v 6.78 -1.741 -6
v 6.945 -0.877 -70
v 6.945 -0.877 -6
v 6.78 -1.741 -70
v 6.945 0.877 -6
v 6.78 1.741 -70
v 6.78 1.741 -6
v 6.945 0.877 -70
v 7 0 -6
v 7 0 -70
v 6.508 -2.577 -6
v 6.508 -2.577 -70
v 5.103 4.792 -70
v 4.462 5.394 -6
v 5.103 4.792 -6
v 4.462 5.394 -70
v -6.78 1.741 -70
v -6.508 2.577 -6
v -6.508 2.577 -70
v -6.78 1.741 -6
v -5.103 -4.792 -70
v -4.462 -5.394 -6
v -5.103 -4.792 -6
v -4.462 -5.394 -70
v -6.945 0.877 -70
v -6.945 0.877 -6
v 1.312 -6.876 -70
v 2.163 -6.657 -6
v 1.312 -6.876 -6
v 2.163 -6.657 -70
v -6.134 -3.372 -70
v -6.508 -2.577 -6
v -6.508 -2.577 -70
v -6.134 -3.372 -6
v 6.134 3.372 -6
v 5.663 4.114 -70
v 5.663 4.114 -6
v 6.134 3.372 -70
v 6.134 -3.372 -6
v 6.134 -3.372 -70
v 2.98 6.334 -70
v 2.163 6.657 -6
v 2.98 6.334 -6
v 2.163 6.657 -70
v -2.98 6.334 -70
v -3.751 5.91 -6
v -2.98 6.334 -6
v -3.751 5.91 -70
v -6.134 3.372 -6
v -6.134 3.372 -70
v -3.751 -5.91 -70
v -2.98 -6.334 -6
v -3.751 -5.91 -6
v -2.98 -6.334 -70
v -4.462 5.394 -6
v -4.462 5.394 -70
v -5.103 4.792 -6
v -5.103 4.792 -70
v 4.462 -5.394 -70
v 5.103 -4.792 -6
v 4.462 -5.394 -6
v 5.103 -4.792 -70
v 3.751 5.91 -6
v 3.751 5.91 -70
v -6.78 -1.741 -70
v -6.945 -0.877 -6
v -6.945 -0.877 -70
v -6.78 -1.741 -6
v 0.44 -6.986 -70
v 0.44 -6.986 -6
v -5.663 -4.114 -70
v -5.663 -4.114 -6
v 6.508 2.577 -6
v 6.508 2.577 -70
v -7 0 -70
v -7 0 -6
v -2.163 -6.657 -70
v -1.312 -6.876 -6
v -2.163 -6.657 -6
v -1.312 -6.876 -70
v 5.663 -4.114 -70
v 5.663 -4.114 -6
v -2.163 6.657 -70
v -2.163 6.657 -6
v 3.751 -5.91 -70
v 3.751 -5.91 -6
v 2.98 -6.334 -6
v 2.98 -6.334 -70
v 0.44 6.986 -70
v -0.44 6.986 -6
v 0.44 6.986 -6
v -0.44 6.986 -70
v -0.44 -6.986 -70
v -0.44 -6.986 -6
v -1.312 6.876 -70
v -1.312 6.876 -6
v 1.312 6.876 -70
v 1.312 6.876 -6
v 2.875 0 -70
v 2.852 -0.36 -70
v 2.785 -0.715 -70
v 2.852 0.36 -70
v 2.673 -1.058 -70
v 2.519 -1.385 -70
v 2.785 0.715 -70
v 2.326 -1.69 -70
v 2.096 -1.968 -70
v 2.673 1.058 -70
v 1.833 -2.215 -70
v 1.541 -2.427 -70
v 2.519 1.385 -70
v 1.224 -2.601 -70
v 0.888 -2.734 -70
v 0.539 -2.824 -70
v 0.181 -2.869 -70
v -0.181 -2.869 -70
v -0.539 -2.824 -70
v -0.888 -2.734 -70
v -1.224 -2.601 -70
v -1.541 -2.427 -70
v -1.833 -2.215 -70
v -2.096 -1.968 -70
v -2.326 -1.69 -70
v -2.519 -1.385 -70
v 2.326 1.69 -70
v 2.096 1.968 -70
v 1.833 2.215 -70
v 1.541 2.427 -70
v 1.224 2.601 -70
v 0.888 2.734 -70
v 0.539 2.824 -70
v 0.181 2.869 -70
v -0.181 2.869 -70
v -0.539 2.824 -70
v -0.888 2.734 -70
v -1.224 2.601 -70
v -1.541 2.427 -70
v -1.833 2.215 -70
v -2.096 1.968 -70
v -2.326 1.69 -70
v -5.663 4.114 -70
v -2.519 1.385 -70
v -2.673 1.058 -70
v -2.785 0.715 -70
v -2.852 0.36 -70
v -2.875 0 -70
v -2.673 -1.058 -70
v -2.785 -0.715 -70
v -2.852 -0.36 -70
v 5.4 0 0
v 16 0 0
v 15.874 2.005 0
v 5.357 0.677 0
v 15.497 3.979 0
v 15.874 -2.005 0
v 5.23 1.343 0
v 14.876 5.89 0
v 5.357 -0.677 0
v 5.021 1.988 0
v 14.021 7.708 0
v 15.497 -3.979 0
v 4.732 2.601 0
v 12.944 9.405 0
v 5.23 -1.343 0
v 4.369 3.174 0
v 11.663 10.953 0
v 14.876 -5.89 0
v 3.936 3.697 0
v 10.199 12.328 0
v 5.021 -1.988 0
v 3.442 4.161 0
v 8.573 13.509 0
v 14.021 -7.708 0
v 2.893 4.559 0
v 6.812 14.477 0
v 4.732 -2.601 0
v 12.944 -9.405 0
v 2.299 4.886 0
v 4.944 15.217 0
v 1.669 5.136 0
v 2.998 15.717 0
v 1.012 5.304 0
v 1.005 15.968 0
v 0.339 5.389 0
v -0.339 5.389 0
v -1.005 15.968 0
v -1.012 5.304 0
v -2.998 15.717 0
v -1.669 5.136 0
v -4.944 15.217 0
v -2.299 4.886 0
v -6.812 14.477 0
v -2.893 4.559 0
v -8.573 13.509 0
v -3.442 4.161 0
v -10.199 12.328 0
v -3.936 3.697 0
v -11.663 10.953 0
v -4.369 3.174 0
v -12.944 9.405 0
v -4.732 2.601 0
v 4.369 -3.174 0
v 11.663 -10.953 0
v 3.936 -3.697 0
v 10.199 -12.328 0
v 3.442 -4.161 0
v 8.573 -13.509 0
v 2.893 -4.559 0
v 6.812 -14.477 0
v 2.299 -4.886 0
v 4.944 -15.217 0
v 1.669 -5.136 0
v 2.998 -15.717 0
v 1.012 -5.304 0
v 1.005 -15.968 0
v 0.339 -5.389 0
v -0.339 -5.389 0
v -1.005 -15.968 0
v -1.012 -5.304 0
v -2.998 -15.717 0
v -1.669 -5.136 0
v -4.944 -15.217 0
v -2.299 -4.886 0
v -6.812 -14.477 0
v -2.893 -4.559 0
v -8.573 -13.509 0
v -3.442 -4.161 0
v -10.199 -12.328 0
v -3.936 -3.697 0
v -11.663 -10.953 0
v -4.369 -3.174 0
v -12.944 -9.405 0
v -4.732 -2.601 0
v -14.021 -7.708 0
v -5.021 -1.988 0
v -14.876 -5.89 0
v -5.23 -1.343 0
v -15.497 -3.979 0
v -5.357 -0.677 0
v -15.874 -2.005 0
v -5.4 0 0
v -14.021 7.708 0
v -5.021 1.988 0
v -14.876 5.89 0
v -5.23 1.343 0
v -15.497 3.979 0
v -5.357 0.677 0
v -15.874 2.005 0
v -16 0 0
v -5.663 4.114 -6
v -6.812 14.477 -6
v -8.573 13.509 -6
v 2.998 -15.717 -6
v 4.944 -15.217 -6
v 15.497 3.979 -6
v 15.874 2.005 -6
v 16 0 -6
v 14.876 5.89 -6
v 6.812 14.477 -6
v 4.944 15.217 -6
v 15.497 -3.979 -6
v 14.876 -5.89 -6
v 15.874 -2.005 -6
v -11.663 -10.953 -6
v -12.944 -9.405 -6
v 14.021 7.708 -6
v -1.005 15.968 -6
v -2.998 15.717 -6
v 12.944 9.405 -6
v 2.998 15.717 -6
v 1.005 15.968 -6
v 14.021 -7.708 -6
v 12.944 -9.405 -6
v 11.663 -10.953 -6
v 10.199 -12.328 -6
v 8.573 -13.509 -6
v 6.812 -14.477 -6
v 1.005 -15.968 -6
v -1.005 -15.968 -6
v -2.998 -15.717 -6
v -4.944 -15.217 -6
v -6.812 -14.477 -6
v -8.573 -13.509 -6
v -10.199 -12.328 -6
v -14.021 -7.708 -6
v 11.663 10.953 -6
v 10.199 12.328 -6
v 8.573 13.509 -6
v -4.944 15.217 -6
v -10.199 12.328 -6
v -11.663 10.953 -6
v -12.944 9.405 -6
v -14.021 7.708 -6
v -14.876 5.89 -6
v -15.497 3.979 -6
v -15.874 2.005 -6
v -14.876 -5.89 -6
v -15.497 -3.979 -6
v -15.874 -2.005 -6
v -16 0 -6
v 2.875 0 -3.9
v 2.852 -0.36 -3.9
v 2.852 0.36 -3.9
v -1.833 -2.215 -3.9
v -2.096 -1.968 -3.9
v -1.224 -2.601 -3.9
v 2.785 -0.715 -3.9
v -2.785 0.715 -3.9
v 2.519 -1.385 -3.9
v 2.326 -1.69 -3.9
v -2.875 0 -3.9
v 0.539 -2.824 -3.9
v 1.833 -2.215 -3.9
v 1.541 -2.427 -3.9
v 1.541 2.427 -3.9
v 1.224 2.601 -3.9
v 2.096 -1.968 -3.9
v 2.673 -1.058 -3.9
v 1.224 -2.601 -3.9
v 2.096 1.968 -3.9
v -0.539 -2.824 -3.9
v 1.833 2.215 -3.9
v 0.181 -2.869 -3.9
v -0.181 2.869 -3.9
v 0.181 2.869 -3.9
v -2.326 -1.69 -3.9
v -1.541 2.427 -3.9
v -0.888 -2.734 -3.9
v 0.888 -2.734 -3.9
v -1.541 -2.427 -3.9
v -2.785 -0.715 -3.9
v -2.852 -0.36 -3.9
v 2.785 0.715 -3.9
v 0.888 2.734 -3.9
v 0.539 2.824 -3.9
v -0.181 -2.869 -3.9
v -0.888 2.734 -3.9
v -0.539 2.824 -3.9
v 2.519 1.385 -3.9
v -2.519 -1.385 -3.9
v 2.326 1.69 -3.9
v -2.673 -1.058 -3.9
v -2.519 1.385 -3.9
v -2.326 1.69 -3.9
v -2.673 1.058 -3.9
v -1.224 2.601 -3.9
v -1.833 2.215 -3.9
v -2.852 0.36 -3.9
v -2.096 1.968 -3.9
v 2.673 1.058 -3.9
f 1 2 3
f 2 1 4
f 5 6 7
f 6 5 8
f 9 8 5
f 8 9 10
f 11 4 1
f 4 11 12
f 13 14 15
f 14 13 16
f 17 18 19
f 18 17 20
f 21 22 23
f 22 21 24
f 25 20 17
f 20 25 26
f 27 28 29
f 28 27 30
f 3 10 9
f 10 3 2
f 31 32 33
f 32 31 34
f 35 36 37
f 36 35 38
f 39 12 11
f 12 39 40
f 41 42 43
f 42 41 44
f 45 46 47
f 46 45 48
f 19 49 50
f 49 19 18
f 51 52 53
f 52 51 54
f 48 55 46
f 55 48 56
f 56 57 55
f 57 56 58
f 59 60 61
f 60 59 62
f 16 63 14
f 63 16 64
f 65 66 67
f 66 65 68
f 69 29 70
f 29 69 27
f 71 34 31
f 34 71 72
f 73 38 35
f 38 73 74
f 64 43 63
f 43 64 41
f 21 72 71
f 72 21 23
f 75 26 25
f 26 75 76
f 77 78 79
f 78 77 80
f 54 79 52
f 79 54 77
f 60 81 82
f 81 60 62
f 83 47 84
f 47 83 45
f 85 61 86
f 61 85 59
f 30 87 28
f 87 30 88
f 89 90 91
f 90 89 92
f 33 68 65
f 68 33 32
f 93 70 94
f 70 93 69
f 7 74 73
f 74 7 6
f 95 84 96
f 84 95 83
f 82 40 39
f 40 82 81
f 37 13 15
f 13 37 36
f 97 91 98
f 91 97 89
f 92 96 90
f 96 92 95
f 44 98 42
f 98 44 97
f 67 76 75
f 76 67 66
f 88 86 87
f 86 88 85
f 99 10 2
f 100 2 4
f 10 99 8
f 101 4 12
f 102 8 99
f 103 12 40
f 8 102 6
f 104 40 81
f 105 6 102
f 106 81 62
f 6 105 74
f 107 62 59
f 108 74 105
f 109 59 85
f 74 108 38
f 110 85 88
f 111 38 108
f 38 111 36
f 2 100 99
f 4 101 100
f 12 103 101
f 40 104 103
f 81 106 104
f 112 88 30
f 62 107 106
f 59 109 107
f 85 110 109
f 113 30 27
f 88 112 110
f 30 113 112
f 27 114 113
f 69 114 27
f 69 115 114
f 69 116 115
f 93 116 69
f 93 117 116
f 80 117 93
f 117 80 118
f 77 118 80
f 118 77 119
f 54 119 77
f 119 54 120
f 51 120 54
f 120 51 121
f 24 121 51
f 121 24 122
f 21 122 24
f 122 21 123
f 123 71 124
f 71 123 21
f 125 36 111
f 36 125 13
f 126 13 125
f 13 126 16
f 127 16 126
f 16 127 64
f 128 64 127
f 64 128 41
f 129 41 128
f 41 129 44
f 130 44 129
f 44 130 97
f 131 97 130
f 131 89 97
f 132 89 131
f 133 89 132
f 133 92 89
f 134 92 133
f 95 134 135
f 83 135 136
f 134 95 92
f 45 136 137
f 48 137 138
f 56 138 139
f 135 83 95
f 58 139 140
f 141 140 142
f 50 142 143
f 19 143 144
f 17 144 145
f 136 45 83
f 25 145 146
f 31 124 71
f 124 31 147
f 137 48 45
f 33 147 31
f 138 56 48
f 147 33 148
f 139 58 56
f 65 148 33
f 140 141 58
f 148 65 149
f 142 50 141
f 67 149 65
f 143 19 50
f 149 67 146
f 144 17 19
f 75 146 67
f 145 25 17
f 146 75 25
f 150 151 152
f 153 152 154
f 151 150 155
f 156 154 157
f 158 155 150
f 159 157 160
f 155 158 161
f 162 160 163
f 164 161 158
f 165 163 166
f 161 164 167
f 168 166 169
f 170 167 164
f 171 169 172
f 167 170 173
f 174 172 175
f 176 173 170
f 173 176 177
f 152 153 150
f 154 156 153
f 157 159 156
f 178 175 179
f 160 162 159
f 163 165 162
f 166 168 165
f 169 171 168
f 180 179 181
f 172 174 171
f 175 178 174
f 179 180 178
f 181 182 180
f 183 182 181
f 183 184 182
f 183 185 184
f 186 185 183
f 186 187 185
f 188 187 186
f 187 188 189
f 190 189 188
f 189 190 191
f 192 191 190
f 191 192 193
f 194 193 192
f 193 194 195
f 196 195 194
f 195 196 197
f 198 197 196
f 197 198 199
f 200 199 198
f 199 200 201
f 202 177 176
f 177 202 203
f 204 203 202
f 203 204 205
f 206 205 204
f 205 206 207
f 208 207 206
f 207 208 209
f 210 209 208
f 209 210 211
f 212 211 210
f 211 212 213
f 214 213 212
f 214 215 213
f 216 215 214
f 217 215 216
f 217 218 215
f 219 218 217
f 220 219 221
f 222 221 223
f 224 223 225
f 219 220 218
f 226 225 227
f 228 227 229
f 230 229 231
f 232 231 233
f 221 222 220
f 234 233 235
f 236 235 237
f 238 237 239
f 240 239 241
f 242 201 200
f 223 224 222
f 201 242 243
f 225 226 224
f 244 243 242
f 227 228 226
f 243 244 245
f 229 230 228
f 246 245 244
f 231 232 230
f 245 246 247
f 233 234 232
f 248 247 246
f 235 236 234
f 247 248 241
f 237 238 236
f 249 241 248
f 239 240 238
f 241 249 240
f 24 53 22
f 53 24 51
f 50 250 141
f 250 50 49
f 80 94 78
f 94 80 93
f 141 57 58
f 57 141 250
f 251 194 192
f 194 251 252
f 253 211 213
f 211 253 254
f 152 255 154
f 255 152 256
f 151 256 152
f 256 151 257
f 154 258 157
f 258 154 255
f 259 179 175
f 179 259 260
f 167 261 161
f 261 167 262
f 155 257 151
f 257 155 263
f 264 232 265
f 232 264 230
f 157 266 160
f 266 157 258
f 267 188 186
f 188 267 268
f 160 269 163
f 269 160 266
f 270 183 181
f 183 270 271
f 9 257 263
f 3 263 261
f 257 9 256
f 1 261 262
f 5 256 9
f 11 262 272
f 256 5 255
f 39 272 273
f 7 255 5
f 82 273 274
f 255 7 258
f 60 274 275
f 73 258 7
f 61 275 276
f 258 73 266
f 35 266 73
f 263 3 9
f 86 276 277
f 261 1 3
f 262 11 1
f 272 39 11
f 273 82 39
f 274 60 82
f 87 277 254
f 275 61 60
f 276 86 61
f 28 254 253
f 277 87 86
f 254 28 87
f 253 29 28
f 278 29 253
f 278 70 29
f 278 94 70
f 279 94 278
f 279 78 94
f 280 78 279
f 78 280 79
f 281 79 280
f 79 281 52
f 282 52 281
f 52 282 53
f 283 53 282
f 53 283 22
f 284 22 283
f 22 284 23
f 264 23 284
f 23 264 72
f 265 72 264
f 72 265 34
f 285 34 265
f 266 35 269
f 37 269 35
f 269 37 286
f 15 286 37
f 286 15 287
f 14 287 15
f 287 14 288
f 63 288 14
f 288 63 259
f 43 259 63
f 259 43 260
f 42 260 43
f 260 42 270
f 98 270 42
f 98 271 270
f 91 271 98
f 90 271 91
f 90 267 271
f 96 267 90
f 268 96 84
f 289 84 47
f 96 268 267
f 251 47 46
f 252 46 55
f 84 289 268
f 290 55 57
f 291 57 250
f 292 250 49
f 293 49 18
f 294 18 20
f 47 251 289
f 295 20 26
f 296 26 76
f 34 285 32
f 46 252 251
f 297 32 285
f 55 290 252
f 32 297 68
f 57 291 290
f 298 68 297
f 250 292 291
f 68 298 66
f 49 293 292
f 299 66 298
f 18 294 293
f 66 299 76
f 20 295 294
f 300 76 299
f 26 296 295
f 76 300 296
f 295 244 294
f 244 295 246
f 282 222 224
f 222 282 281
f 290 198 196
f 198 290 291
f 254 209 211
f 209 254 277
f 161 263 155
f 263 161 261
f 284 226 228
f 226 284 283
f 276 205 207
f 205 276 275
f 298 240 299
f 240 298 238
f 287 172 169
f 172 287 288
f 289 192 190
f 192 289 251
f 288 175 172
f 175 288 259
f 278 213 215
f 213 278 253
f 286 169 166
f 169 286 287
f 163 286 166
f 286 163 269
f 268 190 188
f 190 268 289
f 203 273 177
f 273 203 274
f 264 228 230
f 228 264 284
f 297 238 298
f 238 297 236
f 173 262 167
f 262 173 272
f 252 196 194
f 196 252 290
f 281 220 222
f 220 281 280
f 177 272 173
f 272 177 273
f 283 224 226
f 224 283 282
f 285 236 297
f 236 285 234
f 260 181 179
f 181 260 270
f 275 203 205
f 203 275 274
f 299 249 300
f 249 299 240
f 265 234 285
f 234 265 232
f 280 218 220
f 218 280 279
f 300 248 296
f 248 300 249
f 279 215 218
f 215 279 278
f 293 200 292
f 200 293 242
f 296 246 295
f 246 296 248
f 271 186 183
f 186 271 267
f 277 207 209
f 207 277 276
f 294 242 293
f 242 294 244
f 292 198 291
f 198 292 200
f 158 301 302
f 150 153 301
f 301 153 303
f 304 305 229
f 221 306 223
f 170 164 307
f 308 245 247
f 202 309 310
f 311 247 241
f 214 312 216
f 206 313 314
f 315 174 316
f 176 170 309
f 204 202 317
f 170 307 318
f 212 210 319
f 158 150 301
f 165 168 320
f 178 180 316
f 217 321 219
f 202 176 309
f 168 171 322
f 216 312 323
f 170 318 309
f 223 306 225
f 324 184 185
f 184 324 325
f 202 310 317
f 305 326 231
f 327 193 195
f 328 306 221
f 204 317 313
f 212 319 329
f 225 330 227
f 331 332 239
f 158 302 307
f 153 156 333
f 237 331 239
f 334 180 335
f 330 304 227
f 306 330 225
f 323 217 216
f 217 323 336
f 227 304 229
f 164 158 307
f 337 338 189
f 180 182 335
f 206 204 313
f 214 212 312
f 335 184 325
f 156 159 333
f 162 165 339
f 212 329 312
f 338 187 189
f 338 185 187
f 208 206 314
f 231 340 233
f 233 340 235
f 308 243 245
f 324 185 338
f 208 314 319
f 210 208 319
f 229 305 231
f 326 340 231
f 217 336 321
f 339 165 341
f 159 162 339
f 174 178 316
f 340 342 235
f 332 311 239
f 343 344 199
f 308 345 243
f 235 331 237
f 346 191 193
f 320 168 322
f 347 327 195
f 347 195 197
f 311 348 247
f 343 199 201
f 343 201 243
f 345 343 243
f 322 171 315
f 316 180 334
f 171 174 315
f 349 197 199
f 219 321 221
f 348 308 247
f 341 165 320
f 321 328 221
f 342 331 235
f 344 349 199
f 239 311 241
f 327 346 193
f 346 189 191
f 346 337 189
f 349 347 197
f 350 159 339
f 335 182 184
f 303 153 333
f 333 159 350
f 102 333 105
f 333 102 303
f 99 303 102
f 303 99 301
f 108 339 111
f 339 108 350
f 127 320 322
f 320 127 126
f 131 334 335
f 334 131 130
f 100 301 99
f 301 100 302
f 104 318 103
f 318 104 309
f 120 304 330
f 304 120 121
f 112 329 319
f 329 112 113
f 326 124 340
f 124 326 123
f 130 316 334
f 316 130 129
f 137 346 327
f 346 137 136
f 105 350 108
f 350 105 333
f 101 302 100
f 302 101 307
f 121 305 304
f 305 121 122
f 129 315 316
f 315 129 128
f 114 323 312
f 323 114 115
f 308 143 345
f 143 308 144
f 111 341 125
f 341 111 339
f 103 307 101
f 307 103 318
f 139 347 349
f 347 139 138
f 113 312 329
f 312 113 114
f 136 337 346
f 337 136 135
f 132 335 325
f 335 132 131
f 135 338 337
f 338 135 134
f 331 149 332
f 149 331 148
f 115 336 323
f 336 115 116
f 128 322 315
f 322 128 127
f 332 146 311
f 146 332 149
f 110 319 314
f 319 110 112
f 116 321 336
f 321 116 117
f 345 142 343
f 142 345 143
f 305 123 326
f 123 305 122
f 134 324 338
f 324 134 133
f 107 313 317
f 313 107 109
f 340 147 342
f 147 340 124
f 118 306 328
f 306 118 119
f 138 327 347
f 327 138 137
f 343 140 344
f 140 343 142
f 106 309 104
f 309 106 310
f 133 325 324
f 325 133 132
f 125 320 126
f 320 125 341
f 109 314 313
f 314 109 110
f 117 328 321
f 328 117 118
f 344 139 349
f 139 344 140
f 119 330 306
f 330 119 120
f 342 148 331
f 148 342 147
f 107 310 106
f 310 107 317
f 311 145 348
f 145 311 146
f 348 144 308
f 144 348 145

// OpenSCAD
$fn = 50;


difference() {
	union() {
		translate(v = [0, 0, -70.0000000000]) {
			cylinder(h = 70, r = 7.0000000000);
		}
		translate(v = [0, 0, -6.0000000000]) {
			cylinder(h = 6, r = 16.0000000000);
		}
	}
	union() {
		translate(v = [0, 0, 0]) {
			rotate(a = [0, 0, 0]) {
				difference() {
					union() {
						#translate(v = [0, 0, -70.0000000000]) {
							cylinder(h = 70, r = 2.6000000000);
						}
						#translate(v = [0, 0, -3.9000000000]) {
							cylinder(h = 3.9000000000, r = 7.0000000000, r1 = 2.8750000000, r2 = 5.4000000000);
						}
						#translate(v = [0, 0, -70.0000000000]) {
							cylinder(h = 70, r = 2.8750000000);
						}
						#translate(v = [0, 0, -70.0000000000]) {
							cylinder(h = 70, r = 2.6000000000);
						}
					}
					union();
				}
			}
		}
	}
}
